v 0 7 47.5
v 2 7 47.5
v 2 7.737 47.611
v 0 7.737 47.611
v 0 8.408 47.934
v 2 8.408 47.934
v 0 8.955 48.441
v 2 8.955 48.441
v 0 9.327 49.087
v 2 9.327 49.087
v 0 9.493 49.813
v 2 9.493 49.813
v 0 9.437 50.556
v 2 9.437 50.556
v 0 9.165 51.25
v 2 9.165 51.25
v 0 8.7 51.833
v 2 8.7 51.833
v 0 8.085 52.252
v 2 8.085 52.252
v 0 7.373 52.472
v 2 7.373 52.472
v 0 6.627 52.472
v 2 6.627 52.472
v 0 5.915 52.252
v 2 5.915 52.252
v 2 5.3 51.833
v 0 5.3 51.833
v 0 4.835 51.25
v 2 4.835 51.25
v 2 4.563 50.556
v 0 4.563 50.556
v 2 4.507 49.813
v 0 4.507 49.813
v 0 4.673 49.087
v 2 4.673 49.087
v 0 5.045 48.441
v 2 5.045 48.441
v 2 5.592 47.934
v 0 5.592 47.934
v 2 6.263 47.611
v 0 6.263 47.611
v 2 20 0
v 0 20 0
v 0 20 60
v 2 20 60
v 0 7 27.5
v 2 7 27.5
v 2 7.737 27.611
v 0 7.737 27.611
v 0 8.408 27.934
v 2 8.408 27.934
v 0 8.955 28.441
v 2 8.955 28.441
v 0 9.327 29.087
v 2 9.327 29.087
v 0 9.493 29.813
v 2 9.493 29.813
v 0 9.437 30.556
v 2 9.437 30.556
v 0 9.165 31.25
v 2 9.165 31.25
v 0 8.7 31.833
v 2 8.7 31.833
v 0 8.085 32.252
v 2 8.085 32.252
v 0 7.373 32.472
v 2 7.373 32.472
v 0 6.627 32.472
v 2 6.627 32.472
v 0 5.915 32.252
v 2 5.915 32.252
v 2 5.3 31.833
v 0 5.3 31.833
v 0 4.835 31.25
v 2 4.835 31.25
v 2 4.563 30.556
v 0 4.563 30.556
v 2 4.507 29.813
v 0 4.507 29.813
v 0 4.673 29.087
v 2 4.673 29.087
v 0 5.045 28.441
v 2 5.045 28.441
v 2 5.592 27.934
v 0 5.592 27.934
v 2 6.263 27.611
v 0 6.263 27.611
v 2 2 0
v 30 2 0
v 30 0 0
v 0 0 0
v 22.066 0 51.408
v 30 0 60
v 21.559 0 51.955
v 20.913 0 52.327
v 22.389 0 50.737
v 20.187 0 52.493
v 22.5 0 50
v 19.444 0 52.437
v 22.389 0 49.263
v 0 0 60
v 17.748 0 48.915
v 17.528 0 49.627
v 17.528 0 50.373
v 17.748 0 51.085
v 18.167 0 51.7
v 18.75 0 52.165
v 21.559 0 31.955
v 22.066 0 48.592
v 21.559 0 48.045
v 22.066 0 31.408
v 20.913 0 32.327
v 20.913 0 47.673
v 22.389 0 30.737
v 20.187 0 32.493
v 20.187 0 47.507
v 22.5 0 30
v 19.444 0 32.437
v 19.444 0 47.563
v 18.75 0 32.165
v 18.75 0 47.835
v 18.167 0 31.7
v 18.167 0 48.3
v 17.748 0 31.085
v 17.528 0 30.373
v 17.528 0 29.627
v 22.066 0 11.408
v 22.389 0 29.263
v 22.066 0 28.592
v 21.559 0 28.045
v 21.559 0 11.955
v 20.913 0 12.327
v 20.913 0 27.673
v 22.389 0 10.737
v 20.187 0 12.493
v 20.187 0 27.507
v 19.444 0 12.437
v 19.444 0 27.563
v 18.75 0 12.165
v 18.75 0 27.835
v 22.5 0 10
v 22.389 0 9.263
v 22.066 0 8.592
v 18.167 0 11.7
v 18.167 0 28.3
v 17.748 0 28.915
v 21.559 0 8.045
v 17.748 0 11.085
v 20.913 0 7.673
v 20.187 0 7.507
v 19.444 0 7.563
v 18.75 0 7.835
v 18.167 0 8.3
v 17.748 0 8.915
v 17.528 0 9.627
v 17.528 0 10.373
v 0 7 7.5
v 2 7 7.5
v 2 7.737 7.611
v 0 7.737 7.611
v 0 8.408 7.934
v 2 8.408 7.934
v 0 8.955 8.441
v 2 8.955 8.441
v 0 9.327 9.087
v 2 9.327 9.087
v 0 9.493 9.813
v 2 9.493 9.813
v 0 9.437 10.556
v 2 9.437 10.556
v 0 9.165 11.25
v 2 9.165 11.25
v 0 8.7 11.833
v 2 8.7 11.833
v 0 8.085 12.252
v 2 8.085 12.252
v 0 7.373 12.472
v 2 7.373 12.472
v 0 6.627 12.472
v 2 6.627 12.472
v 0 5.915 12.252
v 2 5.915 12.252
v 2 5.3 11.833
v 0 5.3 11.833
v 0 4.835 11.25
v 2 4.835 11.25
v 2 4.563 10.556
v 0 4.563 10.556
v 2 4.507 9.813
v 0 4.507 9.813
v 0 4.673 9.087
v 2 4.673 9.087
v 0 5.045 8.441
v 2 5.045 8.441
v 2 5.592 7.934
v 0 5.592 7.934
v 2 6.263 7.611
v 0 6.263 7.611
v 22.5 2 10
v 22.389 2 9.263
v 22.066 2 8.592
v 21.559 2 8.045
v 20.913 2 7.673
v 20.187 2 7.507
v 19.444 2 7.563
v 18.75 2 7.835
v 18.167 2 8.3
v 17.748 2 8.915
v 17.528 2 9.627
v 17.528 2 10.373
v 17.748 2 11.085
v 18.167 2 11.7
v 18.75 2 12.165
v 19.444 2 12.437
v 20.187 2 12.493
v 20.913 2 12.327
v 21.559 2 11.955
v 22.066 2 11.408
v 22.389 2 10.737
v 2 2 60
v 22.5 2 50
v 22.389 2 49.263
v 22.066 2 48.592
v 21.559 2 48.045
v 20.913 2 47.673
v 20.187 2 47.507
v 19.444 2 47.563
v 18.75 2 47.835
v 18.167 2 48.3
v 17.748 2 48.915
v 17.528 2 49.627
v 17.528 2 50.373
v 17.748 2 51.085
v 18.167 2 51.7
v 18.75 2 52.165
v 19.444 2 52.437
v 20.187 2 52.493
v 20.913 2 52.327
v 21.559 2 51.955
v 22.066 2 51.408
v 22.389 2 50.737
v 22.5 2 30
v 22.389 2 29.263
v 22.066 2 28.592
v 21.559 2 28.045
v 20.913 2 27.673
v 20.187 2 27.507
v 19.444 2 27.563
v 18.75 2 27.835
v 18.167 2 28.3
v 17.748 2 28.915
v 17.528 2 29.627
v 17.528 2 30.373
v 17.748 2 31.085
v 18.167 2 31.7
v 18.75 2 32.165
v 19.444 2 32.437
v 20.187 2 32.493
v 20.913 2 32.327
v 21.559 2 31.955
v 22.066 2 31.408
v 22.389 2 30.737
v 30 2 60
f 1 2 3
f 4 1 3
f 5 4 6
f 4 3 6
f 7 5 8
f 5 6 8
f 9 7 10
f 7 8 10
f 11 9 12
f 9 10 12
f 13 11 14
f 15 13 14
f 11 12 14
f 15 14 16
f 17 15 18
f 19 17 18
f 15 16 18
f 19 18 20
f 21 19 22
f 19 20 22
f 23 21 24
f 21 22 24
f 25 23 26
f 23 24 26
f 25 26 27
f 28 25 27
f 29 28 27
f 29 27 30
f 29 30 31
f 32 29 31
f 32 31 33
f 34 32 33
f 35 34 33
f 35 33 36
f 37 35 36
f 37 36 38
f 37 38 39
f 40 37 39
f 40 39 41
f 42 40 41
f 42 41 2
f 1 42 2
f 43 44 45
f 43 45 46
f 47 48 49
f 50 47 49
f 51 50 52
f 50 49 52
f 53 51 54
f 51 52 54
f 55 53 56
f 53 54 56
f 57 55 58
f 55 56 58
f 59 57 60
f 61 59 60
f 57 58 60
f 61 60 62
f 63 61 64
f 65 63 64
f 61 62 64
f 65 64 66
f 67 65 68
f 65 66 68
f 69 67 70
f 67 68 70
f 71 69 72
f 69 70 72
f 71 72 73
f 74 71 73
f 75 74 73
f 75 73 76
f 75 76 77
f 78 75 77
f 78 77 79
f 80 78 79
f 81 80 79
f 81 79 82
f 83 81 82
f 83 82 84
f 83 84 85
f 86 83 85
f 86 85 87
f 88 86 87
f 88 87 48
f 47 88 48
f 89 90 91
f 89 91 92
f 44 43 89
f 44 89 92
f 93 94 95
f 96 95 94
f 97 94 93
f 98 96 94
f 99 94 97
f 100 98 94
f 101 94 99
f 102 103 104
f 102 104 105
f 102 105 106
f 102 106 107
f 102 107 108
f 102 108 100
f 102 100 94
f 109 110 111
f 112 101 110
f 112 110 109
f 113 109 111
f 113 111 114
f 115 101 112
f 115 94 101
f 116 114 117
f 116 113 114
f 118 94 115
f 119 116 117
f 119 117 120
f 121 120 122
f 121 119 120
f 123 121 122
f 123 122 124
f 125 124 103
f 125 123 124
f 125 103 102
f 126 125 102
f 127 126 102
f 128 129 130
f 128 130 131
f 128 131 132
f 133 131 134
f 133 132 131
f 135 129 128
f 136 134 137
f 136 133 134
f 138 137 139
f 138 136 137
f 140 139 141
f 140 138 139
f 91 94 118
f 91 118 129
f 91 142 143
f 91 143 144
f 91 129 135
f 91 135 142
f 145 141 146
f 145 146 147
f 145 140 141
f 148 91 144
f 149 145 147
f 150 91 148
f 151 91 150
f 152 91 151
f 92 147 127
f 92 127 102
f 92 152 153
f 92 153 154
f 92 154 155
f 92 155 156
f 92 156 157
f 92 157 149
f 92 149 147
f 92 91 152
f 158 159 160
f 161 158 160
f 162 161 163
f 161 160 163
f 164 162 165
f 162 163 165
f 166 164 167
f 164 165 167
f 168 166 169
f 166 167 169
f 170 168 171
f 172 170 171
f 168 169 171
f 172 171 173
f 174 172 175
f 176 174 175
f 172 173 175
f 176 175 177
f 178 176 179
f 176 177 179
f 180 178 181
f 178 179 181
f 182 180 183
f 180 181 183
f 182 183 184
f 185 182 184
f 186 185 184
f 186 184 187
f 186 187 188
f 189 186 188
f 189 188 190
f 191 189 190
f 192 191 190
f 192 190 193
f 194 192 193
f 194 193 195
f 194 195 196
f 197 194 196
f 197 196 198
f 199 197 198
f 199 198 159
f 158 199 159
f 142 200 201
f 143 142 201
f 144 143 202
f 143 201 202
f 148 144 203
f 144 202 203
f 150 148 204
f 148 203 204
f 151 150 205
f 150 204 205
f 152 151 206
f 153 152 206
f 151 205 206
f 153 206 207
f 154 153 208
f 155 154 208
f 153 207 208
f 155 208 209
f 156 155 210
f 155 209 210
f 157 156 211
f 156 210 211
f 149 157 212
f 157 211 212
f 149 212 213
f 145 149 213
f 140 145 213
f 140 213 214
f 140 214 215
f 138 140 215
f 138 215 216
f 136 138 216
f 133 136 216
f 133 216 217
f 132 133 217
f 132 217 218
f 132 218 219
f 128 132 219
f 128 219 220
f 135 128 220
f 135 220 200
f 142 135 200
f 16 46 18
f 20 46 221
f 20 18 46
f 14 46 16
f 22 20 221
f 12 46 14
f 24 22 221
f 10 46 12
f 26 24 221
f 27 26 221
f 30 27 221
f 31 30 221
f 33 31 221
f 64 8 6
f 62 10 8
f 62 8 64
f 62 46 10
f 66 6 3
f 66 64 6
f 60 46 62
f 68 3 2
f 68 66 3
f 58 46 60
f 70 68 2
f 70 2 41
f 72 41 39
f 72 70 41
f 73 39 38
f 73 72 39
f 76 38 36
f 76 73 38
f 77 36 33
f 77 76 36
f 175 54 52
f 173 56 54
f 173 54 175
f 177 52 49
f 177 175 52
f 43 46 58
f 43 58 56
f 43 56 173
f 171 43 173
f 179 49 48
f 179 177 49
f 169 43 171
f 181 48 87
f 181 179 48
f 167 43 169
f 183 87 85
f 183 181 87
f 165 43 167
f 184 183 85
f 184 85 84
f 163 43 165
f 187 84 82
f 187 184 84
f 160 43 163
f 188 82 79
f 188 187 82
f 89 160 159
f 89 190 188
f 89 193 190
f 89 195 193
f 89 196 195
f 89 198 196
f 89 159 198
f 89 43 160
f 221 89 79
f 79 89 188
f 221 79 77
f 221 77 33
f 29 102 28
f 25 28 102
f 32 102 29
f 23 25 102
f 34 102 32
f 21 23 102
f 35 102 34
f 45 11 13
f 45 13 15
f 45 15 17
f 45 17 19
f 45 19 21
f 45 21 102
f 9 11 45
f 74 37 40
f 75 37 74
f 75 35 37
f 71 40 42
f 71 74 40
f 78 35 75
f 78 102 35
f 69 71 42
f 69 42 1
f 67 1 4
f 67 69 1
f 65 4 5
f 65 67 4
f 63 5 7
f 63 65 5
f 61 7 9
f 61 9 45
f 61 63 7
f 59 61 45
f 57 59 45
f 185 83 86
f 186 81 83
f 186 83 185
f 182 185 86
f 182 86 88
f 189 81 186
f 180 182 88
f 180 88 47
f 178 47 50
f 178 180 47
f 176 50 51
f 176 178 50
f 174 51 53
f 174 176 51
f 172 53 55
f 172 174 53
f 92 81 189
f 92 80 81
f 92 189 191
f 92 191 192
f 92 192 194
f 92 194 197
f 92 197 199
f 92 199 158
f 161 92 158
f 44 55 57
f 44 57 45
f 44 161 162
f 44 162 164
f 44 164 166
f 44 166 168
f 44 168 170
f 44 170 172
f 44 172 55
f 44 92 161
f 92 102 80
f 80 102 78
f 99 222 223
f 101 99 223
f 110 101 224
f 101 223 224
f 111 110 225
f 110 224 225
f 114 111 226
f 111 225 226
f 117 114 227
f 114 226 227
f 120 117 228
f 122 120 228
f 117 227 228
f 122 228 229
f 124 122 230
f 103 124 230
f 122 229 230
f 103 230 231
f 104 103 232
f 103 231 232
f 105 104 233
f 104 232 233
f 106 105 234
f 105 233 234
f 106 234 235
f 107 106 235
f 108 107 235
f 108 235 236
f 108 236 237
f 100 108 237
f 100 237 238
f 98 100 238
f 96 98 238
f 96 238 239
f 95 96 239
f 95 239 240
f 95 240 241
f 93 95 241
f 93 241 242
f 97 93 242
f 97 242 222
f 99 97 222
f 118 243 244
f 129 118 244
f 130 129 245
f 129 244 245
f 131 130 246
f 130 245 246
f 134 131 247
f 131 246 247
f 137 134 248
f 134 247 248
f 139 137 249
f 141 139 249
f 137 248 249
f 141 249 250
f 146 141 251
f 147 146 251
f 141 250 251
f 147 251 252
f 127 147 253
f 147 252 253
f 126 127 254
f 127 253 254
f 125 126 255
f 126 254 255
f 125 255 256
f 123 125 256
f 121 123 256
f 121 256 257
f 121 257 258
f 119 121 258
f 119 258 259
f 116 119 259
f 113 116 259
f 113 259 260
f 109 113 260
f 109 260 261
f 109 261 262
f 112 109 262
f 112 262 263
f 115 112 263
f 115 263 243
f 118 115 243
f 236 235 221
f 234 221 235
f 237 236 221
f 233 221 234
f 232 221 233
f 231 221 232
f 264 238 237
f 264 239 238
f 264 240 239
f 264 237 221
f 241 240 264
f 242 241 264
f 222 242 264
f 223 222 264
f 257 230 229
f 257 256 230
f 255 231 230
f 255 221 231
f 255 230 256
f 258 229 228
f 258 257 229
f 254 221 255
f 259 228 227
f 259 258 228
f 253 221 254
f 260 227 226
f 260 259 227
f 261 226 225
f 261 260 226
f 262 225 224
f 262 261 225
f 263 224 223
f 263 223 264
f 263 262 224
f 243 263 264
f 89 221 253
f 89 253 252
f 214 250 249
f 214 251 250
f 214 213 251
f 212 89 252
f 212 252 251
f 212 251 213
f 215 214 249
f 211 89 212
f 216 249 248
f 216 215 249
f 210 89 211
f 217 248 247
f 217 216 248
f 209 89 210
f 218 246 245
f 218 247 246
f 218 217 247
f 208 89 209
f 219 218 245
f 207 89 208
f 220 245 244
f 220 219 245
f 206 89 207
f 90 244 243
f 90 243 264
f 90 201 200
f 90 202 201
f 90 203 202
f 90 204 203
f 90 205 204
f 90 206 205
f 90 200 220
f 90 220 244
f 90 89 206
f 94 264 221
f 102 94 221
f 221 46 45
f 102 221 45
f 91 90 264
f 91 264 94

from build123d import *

# Parameters (mm, degrees)
BOSS_EXTRUDE1_DEPTH = 60
SKETCH2_R           = 2.5
CUT_EXTRUDE1_DEPTH  = 10
SKETCH3_R           = 2.5
CUT_EXTRUDE2_DEPTH  = 10


with BuildPart() as part:
    # Sketch1 → Boss-Extrude1 (new body)
    with BuildSketch(Plane.XY):
        Polygon((0, 0), (0, 20), (2, 20), (2, 2), (30, 2), (30, 0), align=None)
    extrude(amount=BOSS_EXTRUDE1_DEPTH)

    # Sketch2 → Cut-Extrude1 (cut)
    with BuildSketch(Plane(origin=(0, 2, 0), x_dir=(1, 0, 0), z_dir=(0, 1, 0))):
        with Locations((20, -30)):
            Circle(SKETCH2_R)
        with Locations((20, -10)):
            Circle(SKETCH2_R)
        with Locations((20, -50)):
            Circle(SKETCH2_R)
    extrude(amount=-CUT_EXTRUDE1_DEPTH, mode=Mode.SUBTRACT)

    # Sketch3 → Cut-Extrude2 (cut)
    with BuildSketch(Plane(origin=(2, 0, 0), x_dir=(0, 0, -1), z_dir=(1, 0, 0))):
        with Locations((-30, 7)):
            Circle(SKETCH3_R)
        with Locations((-10, 7)):
            Circle(SKETCH3_R)
        with Locations((-50, 7)):
            Circle(SKETCH3_R)
    extrude(amount=-CUT_EXTRUDE2_DEPTH, mode=Mode.SUBTRACT)


solid = part.part
